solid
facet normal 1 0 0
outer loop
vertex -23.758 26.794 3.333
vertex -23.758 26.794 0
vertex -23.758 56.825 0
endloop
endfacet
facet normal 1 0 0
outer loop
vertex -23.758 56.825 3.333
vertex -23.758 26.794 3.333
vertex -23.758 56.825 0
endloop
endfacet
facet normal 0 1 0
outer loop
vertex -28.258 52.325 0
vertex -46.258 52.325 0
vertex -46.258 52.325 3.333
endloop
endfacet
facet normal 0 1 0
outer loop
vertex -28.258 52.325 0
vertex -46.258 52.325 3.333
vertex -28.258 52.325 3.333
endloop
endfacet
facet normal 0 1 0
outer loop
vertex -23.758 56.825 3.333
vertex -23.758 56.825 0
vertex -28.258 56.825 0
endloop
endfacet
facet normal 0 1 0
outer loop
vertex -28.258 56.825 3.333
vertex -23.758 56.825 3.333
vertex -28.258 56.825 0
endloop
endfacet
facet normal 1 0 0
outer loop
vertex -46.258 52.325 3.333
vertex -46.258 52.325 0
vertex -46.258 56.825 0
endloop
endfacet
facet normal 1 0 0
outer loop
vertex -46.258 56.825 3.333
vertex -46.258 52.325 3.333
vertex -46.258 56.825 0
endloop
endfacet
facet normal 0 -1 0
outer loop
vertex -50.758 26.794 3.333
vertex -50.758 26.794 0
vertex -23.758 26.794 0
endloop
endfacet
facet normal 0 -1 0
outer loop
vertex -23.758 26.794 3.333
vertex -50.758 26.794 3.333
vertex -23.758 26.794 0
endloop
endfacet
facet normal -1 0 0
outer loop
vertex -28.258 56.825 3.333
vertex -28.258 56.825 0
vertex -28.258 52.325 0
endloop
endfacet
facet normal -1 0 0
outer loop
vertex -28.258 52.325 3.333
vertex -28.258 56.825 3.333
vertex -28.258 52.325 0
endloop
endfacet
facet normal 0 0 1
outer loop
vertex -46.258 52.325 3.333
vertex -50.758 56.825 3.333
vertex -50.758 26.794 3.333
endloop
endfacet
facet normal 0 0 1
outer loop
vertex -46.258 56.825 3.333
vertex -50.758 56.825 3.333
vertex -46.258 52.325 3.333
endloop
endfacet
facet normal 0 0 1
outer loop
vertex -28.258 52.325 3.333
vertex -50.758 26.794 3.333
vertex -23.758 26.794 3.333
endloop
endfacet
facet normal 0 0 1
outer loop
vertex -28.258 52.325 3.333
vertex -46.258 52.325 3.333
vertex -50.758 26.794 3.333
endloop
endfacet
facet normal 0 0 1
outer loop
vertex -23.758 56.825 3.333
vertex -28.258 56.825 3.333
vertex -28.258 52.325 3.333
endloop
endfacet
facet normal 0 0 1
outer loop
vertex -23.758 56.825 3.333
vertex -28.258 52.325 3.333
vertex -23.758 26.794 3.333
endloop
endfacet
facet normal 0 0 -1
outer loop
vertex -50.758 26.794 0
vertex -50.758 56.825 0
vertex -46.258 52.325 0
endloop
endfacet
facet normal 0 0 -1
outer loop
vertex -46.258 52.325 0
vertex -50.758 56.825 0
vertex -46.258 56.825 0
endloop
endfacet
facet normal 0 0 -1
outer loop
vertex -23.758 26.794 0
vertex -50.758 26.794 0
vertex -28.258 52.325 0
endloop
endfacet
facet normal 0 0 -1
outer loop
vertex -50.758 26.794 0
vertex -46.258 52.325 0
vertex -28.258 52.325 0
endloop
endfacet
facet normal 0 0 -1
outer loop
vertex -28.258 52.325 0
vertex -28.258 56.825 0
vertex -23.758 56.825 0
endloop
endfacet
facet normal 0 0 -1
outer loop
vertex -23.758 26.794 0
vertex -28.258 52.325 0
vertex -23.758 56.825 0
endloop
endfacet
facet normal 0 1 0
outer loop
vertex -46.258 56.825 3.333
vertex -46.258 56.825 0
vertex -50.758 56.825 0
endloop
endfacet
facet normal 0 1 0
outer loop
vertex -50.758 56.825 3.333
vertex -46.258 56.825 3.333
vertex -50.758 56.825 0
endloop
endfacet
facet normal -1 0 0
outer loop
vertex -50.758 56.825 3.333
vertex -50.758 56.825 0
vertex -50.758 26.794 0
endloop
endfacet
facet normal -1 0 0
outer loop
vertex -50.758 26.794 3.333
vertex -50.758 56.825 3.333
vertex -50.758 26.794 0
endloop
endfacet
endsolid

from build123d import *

# Parameters (mm, degrees)
F0_W     = 18
F0_H     = 25.530076
F1_DEPTH = 3.333333


with BuildPart() as f1:
    # F0 (on Top) → F1 (new body)
    with BuildSketch(Plane.XY):
        Polygon((-46.258066, 26.794441), (-46.258066, 52.324517), (-46.258066, 56.824517), (-50.758066, 56.824517), (-50.758066, 26.794441), align=None)
        with Locations((-37.258066, 39.559479)):
            Rectangle(F0_W, F0_H)
        Polygon((-28.258066, 56.824517), (-28.258066, 52.324517), (-28.258066, 26.794441), (-23.758066, 26.794441), (-23.758066, 56.824517), align=None)
    extrude(amount=F1_DEPTH)


solid = f1.part
